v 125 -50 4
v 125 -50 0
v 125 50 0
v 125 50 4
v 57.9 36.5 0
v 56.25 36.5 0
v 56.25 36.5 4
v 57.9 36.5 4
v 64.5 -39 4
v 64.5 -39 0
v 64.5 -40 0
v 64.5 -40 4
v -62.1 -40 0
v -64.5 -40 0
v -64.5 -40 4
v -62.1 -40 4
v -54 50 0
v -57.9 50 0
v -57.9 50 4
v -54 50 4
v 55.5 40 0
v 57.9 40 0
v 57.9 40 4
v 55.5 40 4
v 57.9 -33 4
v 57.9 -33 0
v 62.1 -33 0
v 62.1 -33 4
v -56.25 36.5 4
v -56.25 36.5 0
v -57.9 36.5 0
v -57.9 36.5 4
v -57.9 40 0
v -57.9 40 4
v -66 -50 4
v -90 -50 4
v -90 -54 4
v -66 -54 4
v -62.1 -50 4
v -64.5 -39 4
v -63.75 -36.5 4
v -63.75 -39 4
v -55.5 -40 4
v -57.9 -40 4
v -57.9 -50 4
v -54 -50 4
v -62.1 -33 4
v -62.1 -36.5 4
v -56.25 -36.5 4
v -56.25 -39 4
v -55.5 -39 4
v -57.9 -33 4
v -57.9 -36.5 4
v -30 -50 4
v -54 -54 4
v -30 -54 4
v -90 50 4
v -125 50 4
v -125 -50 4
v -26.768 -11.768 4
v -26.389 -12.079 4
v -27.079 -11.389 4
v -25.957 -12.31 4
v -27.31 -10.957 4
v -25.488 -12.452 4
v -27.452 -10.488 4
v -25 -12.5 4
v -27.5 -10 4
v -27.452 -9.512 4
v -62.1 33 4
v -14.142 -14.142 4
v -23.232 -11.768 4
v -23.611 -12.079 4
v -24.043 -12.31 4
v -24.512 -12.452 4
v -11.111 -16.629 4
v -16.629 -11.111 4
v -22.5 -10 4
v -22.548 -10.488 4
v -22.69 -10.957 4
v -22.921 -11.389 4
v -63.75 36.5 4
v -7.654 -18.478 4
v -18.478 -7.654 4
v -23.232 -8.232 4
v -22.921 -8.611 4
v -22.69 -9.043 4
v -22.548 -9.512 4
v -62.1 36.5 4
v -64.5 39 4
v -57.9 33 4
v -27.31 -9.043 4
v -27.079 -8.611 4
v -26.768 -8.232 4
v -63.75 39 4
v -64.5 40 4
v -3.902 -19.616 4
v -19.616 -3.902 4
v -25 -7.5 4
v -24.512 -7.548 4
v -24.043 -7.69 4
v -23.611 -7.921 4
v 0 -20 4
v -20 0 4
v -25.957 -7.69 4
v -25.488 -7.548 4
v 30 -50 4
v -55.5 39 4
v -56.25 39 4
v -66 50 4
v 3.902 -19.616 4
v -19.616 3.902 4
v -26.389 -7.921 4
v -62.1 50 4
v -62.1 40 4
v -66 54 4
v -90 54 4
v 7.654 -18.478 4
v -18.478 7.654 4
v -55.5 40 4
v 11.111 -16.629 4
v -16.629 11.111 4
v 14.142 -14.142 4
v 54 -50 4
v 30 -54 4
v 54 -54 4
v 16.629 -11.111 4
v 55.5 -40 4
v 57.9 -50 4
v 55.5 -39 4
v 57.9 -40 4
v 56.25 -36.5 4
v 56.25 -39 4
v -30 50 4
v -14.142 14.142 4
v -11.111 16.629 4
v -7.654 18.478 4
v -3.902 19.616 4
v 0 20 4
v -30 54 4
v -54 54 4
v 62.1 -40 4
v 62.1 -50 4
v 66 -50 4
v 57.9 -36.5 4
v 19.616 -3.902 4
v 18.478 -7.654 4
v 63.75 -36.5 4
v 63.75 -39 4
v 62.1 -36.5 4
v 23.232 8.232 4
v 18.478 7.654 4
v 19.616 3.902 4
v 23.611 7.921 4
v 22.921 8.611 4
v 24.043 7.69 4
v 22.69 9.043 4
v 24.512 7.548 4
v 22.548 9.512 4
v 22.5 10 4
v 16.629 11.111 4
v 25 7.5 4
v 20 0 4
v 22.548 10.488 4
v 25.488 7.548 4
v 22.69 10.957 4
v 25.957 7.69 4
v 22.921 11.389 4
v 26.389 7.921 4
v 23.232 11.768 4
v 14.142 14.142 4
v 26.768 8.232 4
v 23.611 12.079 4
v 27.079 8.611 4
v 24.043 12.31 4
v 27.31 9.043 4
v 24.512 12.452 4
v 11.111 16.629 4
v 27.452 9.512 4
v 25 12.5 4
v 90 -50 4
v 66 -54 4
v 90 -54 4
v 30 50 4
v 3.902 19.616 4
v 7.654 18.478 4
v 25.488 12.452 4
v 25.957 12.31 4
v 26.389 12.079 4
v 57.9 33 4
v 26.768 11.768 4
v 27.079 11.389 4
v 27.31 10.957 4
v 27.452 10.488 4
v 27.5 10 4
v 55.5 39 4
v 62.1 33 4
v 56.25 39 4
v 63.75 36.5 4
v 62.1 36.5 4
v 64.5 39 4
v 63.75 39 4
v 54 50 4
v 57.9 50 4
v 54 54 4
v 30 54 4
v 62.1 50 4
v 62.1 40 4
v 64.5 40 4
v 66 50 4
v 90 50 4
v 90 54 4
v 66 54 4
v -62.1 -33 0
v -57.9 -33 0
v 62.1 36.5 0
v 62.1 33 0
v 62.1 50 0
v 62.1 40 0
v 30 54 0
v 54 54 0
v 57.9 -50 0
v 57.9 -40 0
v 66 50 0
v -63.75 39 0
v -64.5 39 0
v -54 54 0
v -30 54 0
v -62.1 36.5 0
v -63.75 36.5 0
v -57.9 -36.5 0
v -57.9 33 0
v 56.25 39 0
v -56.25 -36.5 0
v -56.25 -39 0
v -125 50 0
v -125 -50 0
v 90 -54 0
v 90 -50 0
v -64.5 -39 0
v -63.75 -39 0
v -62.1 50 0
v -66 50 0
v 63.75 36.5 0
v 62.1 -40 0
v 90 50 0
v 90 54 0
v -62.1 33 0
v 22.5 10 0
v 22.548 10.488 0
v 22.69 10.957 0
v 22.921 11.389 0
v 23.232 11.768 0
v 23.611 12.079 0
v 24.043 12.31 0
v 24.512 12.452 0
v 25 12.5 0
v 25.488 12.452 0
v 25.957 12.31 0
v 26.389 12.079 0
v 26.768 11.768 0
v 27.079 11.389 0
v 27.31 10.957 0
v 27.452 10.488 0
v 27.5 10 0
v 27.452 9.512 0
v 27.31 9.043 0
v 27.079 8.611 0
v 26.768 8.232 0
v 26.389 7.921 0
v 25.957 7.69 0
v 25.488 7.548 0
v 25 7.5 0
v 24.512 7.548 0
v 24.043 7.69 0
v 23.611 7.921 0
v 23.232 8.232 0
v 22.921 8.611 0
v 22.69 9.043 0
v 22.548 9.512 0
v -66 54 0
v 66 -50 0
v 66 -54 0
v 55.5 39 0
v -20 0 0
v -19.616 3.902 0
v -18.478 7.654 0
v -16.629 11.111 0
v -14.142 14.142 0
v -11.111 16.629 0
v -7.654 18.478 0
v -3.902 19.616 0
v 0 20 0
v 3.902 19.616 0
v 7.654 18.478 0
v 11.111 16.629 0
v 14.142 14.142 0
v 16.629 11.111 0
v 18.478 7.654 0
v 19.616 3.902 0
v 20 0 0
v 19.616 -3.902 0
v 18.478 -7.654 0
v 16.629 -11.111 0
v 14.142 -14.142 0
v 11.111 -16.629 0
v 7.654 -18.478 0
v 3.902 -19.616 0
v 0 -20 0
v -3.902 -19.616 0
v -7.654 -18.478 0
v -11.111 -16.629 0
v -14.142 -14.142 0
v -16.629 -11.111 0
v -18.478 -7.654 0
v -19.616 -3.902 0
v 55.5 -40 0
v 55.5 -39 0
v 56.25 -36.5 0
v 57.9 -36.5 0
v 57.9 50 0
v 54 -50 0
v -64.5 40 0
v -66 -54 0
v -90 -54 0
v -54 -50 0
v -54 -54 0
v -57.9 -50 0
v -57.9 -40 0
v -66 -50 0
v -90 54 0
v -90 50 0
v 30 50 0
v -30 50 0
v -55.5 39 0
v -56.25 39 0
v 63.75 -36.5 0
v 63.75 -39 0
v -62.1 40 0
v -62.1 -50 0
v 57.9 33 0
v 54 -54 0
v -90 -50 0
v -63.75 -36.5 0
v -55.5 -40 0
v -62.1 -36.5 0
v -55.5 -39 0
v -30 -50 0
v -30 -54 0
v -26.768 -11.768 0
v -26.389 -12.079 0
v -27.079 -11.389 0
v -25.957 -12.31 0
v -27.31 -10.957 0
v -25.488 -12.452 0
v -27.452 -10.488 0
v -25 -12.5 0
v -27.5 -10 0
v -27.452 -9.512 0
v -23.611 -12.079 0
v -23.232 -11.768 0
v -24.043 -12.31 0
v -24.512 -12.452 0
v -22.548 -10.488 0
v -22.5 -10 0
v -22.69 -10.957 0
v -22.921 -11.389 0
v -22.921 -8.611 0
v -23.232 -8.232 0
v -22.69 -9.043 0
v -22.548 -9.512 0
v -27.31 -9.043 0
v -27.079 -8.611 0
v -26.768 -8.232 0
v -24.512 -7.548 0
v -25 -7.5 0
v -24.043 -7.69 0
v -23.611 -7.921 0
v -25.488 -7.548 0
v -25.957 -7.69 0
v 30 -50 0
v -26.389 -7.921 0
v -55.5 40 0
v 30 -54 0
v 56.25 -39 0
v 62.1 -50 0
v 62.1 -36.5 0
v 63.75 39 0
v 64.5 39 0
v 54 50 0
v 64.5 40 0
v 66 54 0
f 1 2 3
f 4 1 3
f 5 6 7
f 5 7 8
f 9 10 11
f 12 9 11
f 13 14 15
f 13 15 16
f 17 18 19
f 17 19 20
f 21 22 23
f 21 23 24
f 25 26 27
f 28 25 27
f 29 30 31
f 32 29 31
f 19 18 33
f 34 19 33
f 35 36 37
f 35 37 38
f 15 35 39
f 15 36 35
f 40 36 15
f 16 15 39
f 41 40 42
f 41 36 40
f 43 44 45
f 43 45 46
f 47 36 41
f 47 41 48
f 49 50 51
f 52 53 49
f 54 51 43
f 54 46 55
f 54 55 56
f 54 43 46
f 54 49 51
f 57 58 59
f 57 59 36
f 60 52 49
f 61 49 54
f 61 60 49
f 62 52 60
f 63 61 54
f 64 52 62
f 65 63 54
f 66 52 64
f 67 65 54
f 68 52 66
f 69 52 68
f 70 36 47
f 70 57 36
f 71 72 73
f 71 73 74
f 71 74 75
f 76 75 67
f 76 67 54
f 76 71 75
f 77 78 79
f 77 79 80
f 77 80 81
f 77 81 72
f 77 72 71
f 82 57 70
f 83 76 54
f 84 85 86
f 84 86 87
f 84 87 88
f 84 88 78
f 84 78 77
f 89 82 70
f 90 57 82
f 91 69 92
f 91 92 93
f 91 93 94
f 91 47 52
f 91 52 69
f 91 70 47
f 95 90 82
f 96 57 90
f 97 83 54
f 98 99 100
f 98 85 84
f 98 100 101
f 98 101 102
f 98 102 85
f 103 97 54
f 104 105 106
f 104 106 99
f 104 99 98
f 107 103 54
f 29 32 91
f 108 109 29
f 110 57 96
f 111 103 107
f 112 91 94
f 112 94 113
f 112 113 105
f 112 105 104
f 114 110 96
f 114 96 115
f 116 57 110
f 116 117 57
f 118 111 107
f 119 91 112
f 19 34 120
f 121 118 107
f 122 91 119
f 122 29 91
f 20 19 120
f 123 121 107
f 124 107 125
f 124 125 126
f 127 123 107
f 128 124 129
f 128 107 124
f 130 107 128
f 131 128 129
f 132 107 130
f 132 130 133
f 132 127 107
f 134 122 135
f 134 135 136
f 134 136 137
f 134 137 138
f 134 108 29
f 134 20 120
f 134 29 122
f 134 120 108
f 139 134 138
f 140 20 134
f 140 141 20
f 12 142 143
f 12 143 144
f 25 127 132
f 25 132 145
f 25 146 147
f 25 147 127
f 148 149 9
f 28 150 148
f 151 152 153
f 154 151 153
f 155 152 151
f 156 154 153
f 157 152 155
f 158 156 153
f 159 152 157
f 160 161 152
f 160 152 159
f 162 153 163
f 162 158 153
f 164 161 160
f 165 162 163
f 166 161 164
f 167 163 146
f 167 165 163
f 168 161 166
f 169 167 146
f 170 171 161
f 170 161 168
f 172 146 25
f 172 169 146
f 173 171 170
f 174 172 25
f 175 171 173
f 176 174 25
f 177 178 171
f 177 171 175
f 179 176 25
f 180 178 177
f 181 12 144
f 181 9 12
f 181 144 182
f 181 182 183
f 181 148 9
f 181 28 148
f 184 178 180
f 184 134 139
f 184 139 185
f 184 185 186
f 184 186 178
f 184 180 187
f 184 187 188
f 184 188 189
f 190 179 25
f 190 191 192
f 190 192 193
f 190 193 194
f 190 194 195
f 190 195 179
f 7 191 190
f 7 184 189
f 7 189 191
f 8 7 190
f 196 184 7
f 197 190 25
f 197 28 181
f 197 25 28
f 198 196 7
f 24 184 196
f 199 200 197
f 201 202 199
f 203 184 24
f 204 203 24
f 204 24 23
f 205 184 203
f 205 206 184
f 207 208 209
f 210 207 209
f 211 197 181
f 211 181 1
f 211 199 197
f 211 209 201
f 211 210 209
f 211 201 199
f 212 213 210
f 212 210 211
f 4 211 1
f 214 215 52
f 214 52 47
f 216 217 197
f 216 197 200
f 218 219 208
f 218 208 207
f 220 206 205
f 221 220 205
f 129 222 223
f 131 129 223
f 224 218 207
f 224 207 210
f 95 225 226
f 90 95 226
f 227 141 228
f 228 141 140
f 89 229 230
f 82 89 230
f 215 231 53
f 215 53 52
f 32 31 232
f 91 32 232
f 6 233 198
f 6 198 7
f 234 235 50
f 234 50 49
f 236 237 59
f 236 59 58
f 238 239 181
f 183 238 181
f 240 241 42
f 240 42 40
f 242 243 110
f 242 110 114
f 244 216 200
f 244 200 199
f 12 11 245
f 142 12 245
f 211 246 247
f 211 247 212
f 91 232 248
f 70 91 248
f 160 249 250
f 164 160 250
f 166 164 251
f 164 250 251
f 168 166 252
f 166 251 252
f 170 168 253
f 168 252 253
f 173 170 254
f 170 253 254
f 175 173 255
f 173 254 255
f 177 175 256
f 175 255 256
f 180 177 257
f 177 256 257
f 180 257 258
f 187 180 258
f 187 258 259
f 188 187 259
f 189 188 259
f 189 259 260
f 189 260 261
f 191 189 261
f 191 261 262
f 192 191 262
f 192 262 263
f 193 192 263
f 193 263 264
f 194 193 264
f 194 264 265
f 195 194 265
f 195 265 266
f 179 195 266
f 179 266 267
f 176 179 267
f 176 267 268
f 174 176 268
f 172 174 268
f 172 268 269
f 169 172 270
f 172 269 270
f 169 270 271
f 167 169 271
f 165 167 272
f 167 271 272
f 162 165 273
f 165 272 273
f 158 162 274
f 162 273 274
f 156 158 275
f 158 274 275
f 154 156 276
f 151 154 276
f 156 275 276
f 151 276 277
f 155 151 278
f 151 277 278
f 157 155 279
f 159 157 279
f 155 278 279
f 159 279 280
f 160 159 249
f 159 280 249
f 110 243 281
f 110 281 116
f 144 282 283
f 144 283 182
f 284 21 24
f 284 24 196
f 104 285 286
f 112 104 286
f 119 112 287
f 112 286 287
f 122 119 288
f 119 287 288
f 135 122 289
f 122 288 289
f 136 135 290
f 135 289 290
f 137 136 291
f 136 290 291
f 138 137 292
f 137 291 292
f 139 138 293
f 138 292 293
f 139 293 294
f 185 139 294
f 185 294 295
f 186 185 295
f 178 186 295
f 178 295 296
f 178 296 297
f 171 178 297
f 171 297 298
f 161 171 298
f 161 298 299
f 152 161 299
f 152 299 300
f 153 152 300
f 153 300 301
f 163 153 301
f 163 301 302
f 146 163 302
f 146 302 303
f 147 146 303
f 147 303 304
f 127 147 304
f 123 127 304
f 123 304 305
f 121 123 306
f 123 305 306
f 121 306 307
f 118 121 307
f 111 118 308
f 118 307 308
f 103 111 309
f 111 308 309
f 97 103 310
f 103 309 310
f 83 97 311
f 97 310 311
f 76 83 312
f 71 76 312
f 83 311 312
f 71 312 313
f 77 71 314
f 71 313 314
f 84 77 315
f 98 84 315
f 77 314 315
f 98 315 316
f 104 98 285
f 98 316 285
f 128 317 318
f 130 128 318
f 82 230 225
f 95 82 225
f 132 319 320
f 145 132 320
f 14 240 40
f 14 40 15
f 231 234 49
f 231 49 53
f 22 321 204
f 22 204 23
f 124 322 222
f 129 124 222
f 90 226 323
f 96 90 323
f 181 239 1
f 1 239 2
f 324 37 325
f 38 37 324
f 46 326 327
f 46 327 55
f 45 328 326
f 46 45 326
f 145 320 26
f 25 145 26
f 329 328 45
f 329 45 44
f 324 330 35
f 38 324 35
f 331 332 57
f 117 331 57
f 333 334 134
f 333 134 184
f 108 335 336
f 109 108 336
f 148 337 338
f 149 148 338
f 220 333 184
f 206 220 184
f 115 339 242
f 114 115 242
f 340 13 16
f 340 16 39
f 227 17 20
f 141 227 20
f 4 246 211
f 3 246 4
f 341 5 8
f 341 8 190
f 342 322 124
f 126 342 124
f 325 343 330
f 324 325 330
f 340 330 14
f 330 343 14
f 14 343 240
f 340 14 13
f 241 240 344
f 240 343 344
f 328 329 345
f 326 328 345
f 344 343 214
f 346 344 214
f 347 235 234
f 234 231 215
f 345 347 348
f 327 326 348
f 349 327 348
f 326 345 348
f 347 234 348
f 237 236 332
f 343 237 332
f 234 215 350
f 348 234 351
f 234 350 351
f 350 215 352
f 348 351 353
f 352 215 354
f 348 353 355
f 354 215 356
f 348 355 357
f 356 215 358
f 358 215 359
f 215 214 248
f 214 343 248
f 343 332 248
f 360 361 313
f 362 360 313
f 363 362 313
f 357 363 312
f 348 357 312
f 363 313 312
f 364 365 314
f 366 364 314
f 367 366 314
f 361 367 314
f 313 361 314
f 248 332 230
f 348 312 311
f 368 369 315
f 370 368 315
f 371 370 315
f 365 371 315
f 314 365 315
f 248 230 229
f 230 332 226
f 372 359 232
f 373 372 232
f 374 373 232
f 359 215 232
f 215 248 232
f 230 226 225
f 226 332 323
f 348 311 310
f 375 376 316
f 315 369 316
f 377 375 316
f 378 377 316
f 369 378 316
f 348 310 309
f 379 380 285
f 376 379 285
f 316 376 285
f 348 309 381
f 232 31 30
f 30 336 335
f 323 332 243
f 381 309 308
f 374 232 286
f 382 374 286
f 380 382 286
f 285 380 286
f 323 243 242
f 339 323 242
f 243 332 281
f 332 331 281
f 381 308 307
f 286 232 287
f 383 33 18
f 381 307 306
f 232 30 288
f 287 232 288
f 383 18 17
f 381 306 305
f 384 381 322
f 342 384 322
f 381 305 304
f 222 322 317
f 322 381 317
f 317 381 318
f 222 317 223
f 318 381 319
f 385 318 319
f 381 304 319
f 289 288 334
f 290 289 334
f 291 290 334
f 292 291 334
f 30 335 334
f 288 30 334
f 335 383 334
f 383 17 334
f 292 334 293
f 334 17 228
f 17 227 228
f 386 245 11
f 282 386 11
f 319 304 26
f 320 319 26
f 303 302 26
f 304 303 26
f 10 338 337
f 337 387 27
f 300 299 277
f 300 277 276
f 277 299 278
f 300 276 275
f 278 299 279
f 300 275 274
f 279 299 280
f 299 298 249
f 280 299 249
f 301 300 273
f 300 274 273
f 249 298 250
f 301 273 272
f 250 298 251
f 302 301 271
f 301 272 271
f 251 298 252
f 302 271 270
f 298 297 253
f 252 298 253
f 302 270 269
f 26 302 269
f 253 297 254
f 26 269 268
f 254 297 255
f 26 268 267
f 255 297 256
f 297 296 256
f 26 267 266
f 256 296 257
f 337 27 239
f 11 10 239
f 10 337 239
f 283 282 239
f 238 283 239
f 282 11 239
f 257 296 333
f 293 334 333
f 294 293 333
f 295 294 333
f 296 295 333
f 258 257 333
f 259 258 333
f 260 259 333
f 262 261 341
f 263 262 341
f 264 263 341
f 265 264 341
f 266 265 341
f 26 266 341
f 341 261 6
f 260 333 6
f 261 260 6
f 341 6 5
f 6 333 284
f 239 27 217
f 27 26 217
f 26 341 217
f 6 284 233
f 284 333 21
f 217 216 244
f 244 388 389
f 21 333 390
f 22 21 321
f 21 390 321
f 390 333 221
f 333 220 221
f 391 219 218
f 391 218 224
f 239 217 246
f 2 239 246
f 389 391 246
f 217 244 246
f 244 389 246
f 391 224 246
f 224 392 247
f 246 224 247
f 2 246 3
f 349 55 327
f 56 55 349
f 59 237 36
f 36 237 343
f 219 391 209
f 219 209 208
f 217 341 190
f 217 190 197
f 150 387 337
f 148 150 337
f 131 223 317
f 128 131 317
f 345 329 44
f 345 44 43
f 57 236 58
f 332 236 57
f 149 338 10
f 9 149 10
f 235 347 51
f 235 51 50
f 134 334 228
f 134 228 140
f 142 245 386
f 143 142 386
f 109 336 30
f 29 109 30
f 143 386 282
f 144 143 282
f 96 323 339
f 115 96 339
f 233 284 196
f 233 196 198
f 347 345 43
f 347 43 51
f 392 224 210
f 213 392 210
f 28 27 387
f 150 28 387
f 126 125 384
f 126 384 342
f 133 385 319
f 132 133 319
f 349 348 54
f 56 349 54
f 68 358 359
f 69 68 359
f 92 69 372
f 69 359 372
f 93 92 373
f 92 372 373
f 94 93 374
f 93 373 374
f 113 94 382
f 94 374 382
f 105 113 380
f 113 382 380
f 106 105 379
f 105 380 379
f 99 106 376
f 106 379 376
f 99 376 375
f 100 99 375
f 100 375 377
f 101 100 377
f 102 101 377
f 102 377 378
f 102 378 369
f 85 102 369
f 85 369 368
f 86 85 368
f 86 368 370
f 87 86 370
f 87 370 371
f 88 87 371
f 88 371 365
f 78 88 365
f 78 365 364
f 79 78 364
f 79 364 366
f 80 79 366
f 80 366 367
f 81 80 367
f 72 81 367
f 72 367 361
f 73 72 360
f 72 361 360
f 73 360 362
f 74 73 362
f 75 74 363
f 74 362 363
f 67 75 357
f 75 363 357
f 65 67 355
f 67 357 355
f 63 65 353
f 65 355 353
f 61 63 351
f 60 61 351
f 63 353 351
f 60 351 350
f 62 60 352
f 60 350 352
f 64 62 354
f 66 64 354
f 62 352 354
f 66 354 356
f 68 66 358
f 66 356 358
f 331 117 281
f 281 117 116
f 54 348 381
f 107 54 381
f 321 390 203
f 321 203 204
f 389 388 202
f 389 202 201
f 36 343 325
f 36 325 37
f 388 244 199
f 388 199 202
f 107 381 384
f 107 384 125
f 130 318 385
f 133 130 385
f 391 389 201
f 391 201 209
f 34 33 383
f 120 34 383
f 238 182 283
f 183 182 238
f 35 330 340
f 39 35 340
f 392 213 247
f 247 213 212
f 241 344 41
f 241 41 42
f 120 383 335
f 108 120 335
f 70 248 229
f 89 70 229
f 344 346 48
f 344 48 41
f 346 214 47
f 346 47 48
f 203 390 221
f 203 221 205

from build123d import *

# Parameters (mm, degrees)
SKETCH1_W           = 250
SKETCH1_H           = 100
BOSS_EXTRUDE1_DEPTH = 4
SKETCH2_W           = 24
SKETCH2_H           = 4
BOSS_EXTRUDE2_DEPTH = 4
CUT_EXTRUDE1_DEPTH  = 10
SKETCH4_R           = 20
SKETCH4_R_2         = 2.5
CUT_EXTRUDE2_DEPTH  = 10


with BuildPart() as part:
    # Sketch1 → Boss-Extrude1 (new body)
    with BuildSketch(Plane.XY):
        Rectangle(SKETCH1_W, SKETCH1_H)
    extrude(amount=BOSS_EXTRUDE1_DEPTH)

    # Sketch2 → Boss-Extrude2 (add)
    with BuildSketch(Plane.XZ.offset(50)):
        with Locations((-78, 2)):
            Rectangle(SKETCH2_W, SKETCH2_H)
        with Locations((-42, 2)):
            Rectangle(SKETCH2_W, SKETCH2_H)
        with Locations((42, 2)):
            Rectangle(SKETCH2_W, SKETCH2_H)
        with Locations((78, 2)):
            Rectangle(SKETCH2_W, SKETCH2_H)
    boss_extrude2 = extrude(amount=BOSS_EXTRUDE2_DEPTH)

    # Mirror1: Boss-Extrude2 across plane
    add(boss_extrude2.mirror(Plane.ZX))

    # Sketch3 → Cut-Extrude1 (cut)
    with BuildSketch(Plane(origin=(0, 0, 0), x_dir=(-1, 0, 0), z_dir=(0, 0, -1))):
        Polygon((-62.1, -50), (-57.9, -50), (-57.9, -40), (-55.5, -40), (-55.5, -39), (-56.25, -39), (-56.25, -36.5), (-57.9, -36.5), (-57.9, -33), (-62.1, -33), (-62.1, -36.5), (-63.75, -36.5), (-63.75, -39), (-64.5, -39), (-64.5, -40), (-62.1, -40), align=None)
        Polygon((57.9, -50), (57.9, -40), (55.5, -40), (55.5, -39), (56.25, -39), (56.25, -36.5), (57.9, -36.5), (57.9, -33), (62.1, -33), (62.1, -36.5), (63.75, -36.5), (63.75, -39), (64.5, -39), (64.5, -40), (62.1, -40), (62.1, -50), align=None)
        Polygon((62.1, 50), (57.9, 50), (57.9, 40), (55.5, 40), (55.5, 39), (56.25, 39), (56.25, 36.5), (57.9, 36.5), (57.9, 33), (62.1, 33), (62.1, 36.5), (63.75, 36.5), (63.75, 39), (64.5, 39), (64.5, 40), (62.1, 40), align=None)
        Polygon((-57.9, 50), (-57.9, 40), (-55.5, 40), (-55.5, 39), (-56.25, 39), (-56.25, 36.5), (-57.9, 36.5), (-57.9, 33), (-62.1, 33), (-62.1, 36.5), (-63.75, 36.5), (-63.75, 39), (-64.5, 39), (-64.5, 40), (-62.1, 40), (-62.1, 50), align=None)
    extrude(amount=-CUT_EXTRUDE1_DEPTH, mode=Mode.SUBTRACT)

    # Sketch4 → Cut-Extrude2 (cut)
    with BuildSketch(Plane(origin=(0, 0, 0), x_dir=(-1, 0, 0), z_dir=(0, 0, -1))):
        Circle(SKETCH4_R)
        with Locations((-25, 10)):
            Circle(SKETCH4_R_2)
        with Locations((25, -10)):
            Circle(SKETCH4_R_2)
    extrude(amount=-CUT_EXTRUDE2_DEPTH, mode=Mode.SUBTRACT)


solid = part.part
